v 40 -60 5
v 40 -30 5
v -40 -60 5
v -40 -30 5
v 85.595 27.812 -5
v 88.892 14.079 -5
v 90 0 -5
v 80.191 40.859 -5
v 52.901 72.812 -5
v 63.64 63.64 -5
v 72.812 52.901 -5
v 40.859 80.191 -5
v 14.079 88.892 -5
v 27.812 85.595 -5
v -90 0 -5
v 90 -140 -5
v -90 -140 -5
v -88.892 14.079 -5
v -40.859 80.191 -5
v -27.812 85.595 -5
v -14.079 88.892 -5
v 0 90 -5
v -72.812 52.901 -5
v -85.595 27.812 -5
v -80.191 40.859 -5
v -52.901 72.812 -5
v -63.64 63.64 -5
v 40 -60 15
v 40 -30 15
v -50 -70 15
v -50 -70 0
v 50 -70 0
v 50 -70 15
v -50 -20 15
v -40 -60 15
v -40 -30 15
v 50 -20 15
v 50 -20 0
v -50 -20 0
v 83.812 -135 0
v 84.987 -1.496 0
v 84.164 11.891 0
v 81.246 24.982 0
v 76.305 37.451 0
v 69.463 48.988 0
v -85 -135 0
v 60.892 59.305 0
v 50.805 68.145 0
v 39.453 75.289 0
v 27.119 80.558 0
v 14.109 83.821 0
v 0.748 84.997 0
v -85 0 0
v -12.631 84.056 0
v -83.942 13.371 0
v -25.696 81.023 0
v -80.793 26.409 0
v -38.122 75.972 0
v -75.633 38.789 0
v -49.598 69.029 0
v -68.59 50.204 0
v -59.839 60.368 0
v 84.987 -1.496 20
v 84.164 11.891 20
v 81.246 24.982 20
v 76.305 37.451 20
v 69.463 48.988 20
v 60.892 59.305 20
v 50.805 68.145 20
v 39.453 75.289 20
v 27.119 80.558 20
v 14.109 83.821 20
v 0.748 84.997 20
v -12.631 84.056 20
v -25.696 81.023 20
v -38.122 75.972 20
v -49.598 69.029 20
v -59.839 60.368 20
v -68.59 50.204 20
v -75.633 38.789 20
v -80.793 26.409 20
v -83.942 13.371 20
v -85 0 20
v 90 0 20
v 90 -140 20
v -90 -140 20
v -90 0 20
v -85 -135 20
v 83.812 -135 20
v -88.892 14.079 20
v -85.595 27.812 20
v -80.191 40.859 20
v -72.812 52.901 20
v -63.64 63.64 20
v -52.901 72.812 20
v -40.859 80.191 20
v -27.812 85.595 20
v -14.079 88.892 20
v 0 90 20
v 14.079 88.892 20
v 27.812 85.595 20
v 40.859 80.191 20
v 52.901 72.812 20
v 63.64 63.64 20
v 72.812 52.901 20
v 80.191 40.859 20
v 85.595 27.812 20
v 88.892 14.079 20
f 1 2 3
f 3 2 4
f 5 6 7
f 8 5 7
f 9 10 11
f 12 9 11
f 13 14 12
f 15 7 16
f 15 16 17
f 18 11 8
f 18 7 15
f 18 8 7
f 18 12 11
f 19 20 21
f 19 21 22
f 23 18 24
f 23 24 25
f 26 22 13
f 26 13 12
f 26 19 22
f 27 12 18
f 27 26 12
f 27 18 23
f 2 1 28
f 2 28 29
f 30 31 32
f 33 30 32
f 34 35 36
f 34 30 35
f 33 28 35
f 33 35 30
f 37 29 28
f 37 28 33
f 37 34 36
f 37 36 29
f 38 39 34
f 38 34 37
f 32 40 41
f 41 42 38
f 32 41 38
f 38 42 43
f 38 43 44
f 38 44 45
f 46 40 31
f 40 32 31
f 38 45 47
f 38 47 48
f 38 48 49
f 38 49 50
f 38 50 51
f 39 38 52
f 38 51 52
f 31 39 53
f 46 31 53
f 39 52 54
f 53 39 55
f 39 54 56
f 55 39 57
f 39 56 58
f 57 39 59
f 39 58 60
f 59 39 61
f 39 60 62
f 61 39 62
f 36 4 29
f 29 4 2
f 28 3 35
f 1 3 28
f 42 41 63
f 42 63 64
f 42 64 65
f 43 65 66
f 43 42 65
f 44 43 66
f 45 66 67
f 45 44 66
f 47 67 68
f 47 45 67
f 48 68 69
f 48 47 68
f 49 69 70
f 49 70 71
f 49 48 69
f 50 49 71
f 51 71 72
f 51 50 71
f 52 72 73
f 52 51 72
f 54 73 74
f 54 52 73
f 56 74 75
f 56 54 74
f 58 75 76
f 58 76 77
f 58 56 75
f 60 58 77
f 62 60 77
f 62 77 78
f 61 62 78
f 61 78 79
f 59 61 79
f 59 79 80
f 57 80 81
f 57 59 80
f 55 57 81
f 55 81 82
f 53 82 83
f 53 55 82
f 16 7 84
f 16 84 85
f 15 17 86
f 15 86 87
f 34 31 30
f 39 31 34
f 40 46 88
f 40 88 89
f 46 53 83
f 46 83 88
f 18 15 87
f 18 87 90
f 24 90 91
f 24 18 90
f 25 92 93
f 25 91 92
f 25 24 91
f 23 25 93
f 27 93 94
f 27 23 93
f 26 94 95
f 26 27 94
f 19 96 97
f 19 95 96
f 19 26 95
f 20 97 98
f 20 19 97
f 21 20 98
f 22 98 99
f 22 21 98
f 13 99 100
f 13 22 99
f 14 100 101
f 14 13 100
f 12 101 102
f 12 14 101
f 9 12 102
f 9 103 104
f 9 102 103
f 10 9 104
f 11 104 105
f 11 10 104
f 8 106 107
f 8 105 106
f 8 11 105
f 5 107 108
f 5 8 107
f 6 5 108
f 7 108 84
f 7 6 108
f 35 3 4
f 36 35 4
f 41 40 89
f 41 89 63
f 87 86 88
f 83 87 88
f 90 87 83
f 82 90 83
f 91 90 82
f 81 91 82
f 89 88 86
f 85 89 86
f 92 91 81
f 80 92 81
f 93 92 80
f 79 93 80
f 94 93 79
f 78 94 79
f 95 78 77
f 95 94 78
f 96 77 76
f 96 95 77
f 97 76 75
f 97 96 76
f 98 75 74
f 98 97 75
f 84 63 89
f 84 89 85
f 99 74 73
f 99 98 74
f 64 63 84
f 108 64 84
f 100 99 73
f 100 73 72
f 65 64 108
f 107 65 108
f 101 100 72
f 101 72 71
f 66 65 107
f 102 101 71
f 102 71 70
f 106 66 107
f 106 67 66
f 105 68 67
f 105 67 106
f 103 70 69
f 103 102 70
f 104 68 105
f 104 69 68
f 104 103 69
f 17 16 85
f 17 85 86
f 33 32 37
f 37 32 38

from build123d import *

# Parameters (mm, degrees)
BOSS_EXTRUDE1_DEPTH = 20
BOSS_EXTRUDE2_START = 5
BOSS_EXTRUDE2_DEPTH = 5
SKETCH3_W           = 100
SKETCH3_H           = 50
BOSS_EXTRUDE3_DEPTH = 15
SHELL1_T            = -10


with BuildPart() as part:
    # Sketch1 → Boss-Extrude1 (new body)
    with BuildSketch(Plane.XY):
        with BuildLine():
            Line((-90, 0), (-90, -140))
            Line((-90, -140), (90, -140))
            Line((90, -140), (90, 0))
            ThreePointArc((90, 0), (0, 90), (-90, 0))
        make_face()
        with BuildLine():
            Line((-85, 0), (-85, -135))
            Line((-85, -135), (83.811538659, -135))
            Line((83.811538659, -135), (84.986825994, -1.496464972))
            ThreePointArc((84.986825994, -1.496464972), (0.74826148, 84.996706435), (-85, 0))
        make_face(mode=Mode.SUBTRACT)
    extrude(amount=BOSS_EXTRUDE1_DEPTH)

    # Sketch2 → Boss-Extrude2 (add)
    with BuildSketch(Plane(origin=(0, 0, 0), x_dir=(-1, 0, 0), z_dir=(0, 0, -1)).offset(BOSS_EXTRUDE2_START)):
        with BuildLine():
            Line((-90, 0), (-90, -140))
            Line((-90, -140), (90, -140))
            Line((90, -140), (90, 0))
            ThreePointArc((90, 0), (0, 90), (-90, 0))
        make_face()
    extrude(amount=-BOSS_EXTRUDE2_DEPTH)

    # Sketch3 → Boss-Extrude3 (add)
    with BuildSketch(Plane.XY):
        with Locations((0, -45)):
            Rectangle(SKETCH3_W, SKETCH3_H)
    extrude(amount=BOSS_EXTRUDE3_DEPTH)

    # Shell1
    shell1_openings = [part.faces().sort_by_distance(p)[0] for p in [
        (0, -45, 15),
    ]]
    offset(amount=SHELL1_T, openings=shell1_openings)


solid = part.part
